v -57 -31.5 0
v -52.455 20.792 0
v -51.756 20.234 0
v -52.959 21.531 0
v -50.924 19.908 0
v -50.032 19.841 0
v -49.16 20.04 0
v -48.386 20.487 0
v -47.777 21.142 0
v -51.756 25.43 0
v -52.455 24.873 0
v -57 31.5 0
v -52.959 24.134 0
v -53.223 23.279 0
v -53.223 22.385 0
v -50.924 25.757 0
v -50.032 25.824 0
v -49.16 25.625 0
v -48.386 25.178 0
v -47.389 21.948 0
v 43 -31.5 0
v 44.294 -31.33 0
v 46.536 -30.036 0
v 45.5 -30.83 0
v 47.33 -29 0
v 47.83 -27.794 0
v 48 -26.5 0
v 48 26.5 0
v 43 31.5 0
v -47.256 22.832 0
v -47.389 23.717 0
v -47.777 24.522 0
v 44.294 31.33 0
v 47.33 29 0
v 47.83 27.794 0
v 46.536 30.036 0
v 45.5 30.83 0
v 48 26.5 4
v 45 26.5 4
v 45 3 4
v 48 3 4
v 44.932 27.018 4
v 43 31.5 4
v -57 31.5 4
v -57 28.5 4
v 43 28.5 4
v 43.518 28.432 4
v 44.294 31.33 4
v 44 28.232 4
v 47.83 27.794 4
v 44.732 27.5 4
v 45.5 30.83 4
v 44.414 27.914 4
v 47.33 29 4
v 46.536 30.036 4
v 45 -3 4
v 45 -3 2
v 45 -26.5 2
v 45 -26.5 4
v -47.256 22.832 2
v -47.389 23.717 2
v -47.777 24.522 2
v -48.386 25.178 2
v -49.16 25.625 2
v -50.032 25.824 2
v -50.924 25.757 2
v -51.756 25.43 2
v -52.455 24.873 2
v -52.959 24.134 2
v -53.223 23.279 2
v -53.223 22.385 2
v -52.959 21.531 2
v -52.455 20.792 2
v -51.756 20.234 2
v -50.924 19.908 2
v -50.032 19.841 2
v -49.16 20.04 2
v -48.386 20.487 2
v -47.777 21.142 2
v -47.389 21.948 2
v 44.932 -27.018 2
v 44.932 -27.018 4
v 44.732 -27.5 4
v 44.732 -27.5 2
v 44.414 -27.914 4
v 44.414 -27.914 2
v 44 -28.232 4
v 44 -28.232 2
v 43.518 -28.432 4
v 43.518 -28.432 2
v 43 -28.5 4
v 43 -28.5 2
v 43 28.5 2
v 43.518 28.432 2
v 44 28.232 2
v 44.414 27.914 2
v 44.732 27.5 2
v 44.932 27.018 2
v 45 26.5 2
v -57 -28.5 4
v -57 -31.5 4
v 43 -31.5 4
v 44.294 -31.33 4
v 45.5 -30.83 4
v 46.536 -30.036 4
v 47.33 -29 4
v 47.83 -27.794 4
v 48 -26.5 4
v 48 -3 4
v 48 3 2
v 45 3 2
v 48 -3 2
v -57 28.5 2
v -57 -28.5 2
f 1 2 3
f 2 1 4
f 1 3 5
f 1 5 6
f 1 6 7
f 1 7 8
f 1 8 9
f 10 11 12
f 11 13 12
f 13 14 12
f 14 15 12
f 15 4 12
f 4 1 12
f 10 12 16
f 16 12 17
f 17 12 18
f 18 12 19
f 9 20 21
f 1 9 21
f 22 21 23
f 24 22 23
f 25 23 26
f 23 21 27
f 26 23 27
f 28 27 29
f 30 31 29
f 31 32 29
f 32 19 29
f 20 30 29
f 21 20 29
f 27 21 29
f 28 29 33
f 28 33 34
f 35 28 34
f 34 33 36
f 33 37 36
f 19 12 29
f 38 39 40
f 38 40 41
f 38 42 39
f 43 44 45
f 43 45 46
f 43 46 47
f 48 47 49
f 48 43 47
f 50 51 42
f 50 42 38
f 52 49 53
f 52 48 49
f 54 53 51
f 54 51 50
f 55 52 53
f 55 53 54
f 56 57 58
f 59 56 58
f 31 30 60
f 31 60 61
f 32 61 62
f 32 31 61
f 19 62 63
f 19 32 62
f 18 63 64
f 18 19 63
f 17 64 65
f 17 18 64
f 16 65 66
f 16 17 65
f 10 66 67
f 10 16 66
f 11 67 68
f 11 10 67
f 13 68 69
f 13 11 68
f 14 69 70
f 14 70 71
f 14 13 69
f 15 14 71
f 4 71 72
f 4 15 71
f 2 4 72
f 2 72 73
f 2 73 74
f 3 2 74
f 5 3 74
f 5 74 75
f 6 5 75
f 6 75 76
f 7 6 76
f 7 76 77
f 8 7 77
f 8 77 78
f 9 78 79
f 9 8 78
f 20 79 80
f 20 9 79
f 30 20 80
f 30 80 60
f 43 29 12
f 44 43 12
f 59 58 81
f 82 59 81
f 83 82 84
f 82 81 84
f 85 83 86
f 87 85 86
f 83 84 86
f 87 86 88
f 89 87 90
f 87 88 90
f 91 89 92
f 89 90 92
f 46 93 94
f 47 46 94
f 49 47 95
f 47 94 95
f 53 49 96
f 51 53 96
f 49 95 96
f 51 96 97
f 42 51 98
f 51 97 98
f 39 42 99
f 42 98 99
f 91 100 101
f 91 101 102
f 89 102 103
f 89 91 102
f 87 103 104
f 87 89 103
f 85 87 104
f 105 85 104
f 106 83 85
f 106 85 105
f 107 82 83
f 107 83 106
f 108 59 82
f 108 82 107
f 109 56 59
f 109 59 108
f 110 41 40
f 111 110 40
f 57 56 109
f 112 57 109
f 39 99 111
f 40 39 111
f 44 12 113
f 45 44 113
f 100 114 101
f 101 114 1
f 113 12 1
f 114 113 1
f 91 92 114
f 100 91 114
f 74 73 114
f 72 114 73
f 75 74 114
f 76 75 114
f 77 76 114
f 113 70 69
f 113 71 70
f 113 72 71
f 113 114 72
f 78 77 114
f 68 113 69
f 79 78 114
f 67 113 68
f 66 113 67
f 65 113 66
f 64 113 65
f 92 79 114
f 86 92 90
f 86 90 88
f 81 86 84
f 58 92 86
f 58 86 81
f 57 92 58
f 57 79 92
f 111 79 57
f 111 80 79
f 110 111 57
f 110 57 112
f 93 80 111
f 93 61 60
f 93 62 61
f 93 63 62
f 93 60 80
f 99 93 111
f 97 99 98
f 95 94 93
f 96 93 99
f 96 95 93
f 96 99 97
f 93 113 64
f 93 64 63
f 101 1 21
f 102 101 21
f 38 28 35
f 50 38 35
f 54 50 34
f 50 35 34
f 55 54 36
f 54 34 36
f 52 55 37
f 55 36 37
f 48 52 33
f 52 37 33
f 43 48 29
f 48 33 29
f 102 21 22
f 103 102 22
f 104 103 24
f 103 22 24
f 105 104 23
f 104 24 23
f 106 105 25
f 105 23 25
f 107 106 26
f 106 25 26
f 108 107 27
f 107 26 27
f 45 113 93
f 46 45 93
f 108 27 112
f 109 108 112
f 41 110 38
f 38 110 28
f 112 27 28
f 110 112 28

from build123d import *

# Parameters (mm, degrees)
F0_R     = 3
F1_DEPTH = 2
F2_DEPTH = 4
F4_DEPTH = 2
F5_DEPTH = 3


with BuildPart() as f1:
    # F0 (on Top) → F1 (new body)
    with BuildSketch(Plane.XY):
        with Locations((-50.25617, 22.832299)):
            Circle(F0_R)
        with BuildLine():
            Line((-57, -28.5), (43, -28.5))
            ThreePointArc((43, -28.5), (44.414214, -27.914214), (45, -26.5))
            Line((45, -26.5), (45, 26.5))
            ThreePointArc((45, 26.5), (44.414214, 27.914214), (43, 28.5))
            Line((43, 28.5), (-57, 28.5))
            Line((-57, 28.5), (-57, -28.5))
        make_face()
        with Locations((-50.25617, 22.832299)):
            Circle(F0_R, mode=Mode.SUBTRACT)
        with BuildLine():
            ThreePointArc((44, -26.5), (43.707107, -27.207107), (43, -27.5))
            Line((43, -27.5), (-43, -27.5))
            ThreePointArc((-43, -27.5), (-43.707107, -27.207107), (-44, -26.5))
            Line((-44, -26.5), (-44, 26.5))
            ThreePointArc((-44, 26.5), (-43.707107, 27.207107), (-43, 27.5))
            Line((-43, 27.5), (43, 27.5))
            ThreePointArc((43, 27.5), (43.707107, 27.207107), (44, 26.5))
            Line((44, 26.5), (44, -26.5))
        make_face(mode=Mode.SUBTRACT)
        with BuildLine():
            Line((-43, -27.5), (43, -27.5))
            ThreePointArc((43, -27.5), (43.707107, -27.207107), (44, -26.5))
            Line((44, -26.5), (44, 26.5))
            ThreePointArc((44, 26.5), (43.707107, 27.207107), (43, 27.5))
            Line((43, 27.5), (-43, 27.5))
            ThreePointArc((-43, 27.5), (-43.707107, 27.207107), (-44, 26.5))
            Line((-44, 26.5), (-44, -26.5))
            ThreePointArc((-44, -26.5), (-43.707107, -27.207107), (-43, -27.5))
        make_face()
    extrude(amount=F1_DEPTH)

    # F0 (on Top) → F2 (join)
    with BuildSketch(Plane.XY):
        with BuildLine():
            ThreePointArc((45, -26.5), (44.414214, -27.914214), (43, -28.5))
            Line((43, -28.5), (-57, -28.5))
            Line((-57, -28.5), (-57, -31.5))
            Line((-57, -31.5), (43, -31.5))
            ThreePointArc((43, -31.5), (46.535534, -30.035534), (48, -26.5))
            Line((48, -26.5), (48, 26.5))
            ThreePointArc((48, 26.5), (46.535534, 30.035534), (43, 31.5))
            Line((43, 31.5), (-57, 31.5))
            Line((-57, 31.5), (-57, 28.5))
            Line((-57, 28.5), (43, 28.5))
            ThreePointArc((43, 28.5), (44.414214, 27.914214), (45, 26.5))
            Line((45, 26.5), (45, -26.5))
        make_face()
    extrude(amount=F2_DEPTH)

    # F3 (on face) → F4 (cut)
    with BuildSketch(Plane.XY.offset(4)):
        Polygon((45, 3), (45, 0), (45, -3), (48, -3), (48, 0), (48, 3), align=None)
    extrude(amount=-F4_DEPTH, mode=Mode.SUBTRACT)

    # F0 (on Top) → F5 (cut)
    with BuildSketch(Plane.XY):
        with Locations((-50.25617, 22.832299)):
            Circle(F0_R)
    extrude(amount=F5_DEPTH, mode=Mode.SUBTRACT)


solid = f1.part
